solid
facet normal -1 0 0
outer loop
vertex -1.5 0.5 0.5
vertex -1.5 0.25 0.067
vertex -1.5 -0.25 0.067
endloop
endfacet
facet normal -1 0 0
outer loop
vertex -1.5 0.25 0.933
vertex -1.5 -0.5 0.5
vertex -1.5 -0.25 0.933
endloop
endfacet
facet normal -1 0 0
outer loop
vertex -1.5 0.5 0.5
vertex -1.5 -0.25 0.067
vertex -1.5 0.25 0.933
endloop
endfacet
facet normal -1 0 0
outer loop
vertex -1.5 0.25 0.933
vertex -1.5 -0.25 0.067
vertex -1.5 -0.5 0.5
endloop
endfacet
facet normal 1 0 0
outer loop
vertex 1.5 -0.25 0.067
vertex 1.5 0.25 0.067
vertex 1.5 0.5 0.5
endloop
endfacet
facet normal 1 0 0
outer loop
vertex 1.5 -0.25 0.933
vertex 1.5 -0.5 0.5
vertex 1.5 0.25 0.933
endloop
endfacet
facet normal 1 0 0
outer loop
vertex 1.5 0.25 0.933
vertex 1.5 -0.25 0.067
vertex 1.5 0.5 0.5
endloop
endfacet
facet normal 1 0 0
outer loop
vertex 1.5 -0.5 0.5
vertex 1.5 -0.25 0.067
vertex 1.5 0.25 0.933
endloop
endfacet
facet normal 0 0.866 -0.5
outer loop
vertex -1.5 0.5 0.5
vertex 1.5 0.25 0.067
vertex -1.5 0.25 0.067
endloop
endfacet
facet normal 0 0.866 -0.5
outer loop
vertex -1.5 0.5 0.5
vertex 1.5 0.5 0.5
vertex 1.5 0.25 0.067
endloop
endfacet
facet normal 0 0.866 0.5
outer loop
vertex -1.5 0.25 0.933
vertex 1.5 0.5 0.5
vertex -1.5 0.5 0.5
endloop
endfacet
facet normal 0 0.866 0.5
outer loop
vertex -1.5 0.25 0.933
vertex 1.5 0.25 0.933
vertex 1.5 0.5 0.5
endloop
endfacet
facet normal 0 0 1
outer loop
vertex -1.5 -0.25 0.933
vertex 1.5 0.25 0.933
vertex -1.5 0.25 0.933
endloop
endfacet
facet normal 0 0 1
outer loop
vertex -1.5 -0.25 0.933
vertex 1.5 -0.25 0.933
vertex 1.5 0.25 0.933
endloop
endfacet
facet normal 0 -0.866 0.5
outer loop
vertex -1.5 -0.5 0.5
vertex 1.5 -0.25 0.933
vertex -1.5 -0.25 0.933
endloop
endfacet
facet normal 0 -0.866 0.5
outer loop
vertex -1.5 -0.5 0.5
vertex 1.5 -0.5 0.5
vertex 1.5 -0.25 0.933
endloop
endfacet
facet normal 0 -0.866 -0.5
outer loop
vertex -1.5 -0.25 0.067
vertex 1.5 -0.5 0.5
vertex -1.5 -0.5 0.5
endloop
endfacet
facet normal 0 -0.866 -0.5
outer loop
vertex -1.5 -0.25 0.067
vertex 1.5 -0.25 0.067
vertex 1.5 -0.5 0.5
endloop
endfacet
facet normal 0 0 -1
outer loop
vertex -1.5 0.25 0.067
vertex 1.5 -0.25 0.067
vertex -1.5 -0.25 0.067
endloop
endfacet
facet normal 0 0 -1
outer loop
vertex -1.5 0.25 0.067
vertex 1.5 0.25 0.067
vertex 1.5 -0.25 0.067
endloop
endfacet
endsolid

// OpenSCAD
//Hexagonal Prism for Stacks of Shapes
//by Slashee the Cow

color("PeachPuff")
translate([0,0,0.5])
rotate([30,0,0])
rotate([0,90,0])
linear_extrude(3, center = true)
circle(d  = 1, $fn = 6);
